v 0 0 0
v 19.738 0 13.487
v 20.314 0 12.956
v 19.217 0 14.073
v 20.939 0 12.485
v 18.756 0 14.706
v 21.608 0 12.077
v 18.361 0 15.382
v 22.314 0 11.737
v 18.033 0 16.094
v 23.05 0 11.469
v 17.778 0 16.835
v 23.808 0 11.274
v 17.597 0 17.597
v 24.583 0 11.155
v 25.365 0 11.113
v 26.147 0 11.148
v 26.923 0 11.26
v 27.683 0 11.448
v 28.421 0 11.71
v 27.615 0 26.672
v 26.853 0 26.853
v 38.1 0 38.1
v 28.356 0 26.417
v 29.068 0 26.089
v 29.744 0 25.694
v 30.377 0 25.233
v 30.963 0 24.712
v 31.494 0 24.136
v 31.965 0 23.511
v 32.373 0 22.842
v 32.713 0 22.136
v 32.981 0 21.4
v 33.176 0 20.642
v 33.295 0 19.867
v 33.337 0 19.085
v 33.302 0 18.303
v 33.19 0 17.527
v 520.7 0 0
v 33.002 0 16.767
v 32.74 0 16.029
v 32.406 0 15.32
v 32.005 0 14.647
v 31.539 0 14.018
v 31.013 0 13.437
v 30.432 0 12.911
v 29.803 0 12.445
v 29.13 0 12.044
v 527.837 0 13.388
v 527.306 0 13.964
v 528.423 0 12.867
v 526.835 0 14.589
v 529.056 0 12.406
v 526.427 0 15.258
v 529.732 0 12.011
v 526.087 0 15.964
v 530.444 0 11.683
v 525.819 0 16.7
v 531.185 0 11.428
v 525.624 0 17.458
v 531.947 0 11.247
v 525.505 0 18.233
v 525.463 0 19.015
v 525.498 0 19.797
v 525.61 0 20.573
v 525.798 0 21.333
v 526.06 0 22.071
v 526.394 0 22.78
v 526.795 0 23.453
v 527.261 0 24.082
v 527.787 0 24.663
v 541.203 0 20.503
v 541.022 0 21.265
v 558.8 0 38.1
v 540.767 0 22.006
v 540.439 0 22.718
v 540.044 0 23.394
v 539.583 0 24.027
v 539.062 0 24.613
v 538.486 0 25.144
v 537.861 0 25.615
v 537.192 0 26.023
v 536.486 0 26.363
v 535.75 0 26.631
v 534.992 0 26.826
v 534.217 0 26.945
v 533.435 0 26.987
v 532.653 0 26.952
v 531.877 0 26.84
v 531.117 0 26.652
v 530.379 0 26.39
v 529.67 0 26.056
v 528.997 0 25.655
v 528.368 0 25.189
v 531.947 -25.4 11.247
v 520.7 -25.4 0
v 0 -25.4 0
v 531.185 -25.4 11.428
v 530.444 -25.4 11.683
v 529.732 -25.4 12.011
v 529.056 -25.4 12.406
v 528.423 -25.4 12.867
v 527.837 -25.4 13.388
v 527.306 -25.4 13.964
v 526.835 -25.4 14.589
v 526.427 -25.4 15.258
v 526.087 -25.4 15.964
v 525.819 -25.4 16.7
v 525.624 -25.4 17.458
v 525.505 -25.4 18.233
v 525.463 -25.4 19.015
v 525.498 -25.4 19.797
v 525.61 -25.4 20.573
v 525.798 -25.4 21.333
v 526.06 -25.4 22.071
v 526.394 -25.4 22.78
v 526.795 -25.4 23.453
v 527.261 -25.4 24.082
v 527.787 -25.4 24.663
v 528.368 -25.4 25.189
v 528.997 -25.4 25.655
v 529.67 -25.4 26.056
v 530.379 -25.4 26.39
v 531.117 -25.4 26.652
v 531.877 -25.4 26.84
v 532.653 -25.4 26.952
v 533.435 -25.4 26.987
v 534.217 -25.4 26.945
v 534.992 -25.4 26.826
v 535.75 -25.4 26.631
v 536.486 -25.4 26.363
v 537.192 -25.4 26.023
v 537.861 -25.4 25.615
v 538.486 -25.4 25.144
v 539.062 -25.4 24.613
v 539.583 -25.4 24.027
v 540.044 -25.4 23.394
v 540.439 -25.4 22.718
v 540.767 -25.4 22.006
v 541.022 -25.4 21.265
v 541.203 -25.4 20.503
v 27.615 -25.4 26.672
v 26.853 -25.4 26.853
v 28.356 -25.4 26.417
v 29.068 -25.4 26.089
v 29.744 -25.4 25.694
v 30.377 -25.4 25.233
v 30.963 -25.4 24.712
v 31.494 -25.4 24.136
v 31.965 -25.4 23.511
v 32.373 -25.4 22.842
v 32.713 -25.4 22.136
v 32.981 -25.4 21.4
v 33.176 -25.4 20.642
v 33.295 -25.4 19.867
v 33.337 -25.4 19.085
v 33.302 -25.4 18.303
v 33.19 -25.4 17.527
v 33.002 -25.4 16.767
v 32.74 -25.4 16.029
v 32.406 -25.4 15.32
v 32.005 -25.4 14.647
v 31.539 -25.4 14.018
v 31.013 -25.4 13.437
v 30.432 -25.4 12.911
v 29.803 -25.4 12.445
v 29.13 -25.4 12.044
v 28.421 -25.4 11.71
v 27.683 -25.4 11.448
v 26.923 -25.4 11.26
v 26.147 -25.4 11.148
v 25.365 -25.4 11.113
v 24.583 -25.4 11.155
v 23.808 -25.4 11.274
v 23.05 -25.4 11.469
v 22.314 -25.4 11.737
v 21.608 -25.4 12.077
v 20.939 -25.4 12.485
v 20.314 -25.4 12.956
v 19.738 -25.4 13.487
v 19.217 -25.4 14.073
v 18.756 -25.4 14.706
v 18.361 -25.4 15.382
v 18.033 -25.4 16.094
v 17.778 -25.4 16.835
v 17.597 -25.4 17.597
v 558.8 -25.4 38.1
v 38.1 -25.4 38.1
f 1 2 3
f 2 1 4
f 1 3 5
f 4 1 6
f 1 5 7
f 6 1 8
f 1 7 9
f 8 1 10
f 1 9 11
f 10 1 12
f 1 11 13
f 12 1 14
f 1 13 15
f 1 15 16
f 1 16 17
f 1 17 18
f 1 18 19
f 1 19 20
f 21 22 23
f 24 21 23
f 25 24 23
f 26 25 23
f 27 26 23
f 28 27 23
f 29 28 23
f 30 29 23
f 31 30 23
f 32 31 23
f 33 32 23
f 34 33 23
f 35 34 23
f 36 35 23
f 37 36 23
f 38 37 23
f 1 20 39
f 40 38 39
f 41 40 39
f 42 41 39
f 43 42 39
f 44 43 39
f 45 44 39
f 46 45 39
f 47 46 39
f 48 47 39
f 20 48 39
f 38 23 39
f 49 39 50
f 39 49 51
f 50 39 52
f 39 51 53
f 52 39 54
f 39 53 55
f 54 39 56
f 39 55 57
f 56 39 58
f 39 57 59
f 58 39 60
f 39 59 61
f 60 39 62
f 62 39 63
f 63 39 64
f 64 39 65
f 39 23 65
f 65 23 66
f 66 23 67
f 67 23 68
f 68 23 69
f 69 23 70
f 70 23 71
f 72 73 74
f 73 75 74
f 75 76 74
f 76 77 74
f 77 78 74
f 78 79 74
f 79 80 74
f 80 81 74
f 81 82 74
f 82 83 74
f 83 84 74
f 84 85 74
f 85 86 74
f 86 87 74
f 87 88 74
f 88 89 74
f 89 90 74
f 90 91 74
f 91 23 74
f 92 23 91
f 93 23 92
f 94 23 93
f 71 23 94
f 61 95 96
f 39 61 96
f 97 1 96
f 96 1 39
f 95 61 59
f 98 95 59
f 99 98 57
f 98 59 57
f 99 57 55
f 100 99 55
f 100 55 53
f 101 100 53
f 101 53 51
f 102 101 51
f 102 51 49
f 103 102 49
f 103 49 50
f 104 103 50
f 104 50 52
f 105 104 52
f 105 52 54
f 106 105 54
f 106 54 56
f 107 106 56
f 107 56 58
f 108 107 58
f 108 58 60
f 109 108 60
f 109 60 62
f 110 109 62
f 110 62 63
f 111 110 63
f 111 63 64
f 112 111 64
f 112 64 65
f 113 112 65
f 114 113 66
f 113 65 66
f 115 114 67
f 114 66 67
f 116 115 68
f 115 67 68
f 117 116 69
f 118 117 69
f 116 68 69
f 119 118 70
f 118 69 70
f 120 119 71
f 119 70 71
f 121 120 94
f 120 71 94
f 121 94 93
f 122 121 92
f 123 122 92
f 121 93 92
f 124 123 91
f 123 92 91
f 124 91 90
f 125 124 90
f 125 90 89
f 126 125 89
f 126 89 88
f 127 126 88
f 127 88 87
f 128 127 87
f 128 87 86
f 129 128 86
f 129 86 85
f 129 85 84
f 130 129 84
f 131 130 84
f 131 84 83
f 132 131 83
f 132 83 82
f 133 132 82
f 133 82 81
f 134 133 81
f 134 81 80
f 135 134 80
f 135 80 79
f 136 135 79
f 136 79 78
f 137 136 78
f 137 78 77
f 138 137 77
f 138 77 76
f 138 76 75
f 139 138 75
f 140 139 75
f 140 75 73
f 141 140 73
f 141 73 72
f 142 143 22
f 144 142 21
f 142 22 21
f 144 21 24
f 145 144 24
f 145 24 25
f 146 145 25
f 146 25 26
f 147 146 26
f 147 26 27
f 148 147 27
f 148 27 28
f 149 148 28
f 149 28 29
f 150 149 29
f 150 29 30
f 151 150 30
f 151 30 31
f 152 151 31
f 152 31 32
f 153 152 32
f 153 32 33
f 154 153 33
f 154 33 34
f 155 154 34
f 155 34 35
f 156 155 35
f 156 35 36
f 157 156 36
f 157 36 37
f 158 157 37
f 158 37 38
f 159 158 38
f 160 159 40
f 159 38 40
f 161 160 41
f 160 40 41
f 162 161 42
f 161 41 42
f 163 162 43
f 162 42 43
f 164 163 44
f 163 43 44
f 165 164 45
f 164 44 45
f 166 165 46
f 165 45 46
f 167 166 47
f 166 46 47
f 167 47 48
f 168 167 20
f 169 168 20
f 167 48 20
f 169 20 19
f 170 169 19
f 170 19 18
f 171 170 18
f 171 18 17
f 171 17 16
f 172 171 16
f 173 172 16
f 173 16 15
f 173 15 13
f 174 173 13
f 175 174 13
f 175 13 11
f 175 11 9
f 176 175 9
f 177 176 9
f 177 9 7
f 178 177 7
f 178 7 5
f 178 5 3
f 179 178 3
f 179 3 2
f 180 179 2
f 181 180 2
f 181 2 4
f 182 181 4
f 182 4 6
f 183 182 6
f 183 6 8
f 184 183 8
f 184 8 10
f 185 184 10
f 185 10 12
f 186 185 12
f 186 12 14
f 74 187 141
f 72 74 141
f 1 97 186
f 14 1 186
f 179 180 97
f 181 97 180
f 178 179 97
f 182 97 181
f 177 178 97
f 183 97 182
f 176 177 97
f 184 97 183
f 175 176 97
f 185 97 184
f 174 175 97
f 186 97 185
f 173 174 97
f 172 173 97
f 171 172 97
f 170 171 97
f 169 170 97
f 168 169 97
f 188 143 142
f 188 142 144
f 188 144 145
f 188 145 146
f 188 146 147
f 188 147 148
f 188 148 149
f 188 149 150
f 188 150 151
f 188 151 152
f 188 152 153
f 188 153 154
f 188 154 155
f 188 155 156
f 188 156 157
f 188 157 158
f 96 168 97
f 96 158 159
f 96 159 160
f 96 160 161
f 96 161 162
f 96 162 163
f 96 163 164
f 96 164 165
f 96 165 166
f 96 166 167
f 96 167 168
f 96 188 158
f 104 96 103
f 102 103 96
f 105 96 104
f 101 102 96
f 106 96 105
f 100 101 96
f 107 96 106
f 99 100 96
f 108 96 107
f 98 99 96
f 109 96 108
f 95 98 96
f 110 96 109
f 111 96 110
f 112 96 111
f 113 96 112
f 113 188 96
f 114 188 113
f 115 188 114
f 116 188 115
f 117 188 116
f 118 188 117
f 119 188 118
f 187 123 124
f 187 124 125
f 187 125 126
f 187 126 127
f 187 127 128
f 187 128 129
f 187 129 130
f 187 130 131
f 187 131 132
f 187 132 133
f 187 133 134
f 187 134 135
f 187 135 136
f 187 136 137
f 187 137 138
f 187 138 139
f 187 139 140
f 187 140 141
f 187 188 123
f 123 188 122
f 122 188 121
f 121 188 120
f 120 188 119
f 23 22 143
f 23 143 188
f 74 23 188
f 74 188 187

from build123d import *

# Parameters (mm, degrees)
F0_W     = 558.8
F0_H     = 38.1
F1_DEPTH = 25.4
F3_D     = 15.875
F5_DEPTH = 50.8
F7_DEPTH = 50.8


# Not quite as in the source:
# - a feature names something its author has since deleted; it is built from what else it names


with BuildPart() as f1:
    # F0 (on Front) → F1 (new body)
    with BuildSketch(Plane.XZ):
        with Locations((279.4, 19.05)):
            Rectangle(F0_W, F0_H)
    extrude(amount=F1_DEPTH)

    # F3 (through all)
    with Locations(Plane.XZ.offset(25.4)):
        with Locations((25.4, 19.05), (533.4, 19.05)):
            Hole(F3_D / 2)

    # F4 (on face) → F5 (cut)
    with BuildSketch(Plane.XZ.offset(25.4)):
        with BuildLine():
            Line((0, 38.1), (0, 0))
            Line((0, 0), (17.5966819335, 17.5966819335))
            ThreePointArc((17.5966819335, 17.5966819335), (19.7873399243, 24.6626600757), (26.8533180665, 26.8533180665))
            Line((26.8533180665, 26.8533180665), (38.1, 38.1))
            Line((38.1, 38.1), (0, 38.1))
        make_face()
    extrude(amount=-F5_DEPTH, mode=Mode.SUBTRACT)

    # F6 (on face) → F7 (cut)
    with BuildSketch(Plane.XZ.offset(25.4)):
        with BuildLine():
            Line((558.8, 0), (558.8, 38.1))
            Line((558.8, 38.1), (541.2033180665, 20.5033180665))
            ThreePointArc((541.2033180665, 20.5033180665), (541.3038833305, 19.7797496478), (541.3375, 19.05))
            ThreePointArc((541.3375, 19.05), (538.4728785762, 12.9450995748), (531.9466819335, 11.2466819335))
            Line((531.9466819335, 11.2466819335), (520.7, 0))
            Line((520.7, 0), (558.8, 0))
        make_face()
    extrude(amount=-F7_DEPTH, mode=Mode.SUBTRACT)


solid = f1.part
